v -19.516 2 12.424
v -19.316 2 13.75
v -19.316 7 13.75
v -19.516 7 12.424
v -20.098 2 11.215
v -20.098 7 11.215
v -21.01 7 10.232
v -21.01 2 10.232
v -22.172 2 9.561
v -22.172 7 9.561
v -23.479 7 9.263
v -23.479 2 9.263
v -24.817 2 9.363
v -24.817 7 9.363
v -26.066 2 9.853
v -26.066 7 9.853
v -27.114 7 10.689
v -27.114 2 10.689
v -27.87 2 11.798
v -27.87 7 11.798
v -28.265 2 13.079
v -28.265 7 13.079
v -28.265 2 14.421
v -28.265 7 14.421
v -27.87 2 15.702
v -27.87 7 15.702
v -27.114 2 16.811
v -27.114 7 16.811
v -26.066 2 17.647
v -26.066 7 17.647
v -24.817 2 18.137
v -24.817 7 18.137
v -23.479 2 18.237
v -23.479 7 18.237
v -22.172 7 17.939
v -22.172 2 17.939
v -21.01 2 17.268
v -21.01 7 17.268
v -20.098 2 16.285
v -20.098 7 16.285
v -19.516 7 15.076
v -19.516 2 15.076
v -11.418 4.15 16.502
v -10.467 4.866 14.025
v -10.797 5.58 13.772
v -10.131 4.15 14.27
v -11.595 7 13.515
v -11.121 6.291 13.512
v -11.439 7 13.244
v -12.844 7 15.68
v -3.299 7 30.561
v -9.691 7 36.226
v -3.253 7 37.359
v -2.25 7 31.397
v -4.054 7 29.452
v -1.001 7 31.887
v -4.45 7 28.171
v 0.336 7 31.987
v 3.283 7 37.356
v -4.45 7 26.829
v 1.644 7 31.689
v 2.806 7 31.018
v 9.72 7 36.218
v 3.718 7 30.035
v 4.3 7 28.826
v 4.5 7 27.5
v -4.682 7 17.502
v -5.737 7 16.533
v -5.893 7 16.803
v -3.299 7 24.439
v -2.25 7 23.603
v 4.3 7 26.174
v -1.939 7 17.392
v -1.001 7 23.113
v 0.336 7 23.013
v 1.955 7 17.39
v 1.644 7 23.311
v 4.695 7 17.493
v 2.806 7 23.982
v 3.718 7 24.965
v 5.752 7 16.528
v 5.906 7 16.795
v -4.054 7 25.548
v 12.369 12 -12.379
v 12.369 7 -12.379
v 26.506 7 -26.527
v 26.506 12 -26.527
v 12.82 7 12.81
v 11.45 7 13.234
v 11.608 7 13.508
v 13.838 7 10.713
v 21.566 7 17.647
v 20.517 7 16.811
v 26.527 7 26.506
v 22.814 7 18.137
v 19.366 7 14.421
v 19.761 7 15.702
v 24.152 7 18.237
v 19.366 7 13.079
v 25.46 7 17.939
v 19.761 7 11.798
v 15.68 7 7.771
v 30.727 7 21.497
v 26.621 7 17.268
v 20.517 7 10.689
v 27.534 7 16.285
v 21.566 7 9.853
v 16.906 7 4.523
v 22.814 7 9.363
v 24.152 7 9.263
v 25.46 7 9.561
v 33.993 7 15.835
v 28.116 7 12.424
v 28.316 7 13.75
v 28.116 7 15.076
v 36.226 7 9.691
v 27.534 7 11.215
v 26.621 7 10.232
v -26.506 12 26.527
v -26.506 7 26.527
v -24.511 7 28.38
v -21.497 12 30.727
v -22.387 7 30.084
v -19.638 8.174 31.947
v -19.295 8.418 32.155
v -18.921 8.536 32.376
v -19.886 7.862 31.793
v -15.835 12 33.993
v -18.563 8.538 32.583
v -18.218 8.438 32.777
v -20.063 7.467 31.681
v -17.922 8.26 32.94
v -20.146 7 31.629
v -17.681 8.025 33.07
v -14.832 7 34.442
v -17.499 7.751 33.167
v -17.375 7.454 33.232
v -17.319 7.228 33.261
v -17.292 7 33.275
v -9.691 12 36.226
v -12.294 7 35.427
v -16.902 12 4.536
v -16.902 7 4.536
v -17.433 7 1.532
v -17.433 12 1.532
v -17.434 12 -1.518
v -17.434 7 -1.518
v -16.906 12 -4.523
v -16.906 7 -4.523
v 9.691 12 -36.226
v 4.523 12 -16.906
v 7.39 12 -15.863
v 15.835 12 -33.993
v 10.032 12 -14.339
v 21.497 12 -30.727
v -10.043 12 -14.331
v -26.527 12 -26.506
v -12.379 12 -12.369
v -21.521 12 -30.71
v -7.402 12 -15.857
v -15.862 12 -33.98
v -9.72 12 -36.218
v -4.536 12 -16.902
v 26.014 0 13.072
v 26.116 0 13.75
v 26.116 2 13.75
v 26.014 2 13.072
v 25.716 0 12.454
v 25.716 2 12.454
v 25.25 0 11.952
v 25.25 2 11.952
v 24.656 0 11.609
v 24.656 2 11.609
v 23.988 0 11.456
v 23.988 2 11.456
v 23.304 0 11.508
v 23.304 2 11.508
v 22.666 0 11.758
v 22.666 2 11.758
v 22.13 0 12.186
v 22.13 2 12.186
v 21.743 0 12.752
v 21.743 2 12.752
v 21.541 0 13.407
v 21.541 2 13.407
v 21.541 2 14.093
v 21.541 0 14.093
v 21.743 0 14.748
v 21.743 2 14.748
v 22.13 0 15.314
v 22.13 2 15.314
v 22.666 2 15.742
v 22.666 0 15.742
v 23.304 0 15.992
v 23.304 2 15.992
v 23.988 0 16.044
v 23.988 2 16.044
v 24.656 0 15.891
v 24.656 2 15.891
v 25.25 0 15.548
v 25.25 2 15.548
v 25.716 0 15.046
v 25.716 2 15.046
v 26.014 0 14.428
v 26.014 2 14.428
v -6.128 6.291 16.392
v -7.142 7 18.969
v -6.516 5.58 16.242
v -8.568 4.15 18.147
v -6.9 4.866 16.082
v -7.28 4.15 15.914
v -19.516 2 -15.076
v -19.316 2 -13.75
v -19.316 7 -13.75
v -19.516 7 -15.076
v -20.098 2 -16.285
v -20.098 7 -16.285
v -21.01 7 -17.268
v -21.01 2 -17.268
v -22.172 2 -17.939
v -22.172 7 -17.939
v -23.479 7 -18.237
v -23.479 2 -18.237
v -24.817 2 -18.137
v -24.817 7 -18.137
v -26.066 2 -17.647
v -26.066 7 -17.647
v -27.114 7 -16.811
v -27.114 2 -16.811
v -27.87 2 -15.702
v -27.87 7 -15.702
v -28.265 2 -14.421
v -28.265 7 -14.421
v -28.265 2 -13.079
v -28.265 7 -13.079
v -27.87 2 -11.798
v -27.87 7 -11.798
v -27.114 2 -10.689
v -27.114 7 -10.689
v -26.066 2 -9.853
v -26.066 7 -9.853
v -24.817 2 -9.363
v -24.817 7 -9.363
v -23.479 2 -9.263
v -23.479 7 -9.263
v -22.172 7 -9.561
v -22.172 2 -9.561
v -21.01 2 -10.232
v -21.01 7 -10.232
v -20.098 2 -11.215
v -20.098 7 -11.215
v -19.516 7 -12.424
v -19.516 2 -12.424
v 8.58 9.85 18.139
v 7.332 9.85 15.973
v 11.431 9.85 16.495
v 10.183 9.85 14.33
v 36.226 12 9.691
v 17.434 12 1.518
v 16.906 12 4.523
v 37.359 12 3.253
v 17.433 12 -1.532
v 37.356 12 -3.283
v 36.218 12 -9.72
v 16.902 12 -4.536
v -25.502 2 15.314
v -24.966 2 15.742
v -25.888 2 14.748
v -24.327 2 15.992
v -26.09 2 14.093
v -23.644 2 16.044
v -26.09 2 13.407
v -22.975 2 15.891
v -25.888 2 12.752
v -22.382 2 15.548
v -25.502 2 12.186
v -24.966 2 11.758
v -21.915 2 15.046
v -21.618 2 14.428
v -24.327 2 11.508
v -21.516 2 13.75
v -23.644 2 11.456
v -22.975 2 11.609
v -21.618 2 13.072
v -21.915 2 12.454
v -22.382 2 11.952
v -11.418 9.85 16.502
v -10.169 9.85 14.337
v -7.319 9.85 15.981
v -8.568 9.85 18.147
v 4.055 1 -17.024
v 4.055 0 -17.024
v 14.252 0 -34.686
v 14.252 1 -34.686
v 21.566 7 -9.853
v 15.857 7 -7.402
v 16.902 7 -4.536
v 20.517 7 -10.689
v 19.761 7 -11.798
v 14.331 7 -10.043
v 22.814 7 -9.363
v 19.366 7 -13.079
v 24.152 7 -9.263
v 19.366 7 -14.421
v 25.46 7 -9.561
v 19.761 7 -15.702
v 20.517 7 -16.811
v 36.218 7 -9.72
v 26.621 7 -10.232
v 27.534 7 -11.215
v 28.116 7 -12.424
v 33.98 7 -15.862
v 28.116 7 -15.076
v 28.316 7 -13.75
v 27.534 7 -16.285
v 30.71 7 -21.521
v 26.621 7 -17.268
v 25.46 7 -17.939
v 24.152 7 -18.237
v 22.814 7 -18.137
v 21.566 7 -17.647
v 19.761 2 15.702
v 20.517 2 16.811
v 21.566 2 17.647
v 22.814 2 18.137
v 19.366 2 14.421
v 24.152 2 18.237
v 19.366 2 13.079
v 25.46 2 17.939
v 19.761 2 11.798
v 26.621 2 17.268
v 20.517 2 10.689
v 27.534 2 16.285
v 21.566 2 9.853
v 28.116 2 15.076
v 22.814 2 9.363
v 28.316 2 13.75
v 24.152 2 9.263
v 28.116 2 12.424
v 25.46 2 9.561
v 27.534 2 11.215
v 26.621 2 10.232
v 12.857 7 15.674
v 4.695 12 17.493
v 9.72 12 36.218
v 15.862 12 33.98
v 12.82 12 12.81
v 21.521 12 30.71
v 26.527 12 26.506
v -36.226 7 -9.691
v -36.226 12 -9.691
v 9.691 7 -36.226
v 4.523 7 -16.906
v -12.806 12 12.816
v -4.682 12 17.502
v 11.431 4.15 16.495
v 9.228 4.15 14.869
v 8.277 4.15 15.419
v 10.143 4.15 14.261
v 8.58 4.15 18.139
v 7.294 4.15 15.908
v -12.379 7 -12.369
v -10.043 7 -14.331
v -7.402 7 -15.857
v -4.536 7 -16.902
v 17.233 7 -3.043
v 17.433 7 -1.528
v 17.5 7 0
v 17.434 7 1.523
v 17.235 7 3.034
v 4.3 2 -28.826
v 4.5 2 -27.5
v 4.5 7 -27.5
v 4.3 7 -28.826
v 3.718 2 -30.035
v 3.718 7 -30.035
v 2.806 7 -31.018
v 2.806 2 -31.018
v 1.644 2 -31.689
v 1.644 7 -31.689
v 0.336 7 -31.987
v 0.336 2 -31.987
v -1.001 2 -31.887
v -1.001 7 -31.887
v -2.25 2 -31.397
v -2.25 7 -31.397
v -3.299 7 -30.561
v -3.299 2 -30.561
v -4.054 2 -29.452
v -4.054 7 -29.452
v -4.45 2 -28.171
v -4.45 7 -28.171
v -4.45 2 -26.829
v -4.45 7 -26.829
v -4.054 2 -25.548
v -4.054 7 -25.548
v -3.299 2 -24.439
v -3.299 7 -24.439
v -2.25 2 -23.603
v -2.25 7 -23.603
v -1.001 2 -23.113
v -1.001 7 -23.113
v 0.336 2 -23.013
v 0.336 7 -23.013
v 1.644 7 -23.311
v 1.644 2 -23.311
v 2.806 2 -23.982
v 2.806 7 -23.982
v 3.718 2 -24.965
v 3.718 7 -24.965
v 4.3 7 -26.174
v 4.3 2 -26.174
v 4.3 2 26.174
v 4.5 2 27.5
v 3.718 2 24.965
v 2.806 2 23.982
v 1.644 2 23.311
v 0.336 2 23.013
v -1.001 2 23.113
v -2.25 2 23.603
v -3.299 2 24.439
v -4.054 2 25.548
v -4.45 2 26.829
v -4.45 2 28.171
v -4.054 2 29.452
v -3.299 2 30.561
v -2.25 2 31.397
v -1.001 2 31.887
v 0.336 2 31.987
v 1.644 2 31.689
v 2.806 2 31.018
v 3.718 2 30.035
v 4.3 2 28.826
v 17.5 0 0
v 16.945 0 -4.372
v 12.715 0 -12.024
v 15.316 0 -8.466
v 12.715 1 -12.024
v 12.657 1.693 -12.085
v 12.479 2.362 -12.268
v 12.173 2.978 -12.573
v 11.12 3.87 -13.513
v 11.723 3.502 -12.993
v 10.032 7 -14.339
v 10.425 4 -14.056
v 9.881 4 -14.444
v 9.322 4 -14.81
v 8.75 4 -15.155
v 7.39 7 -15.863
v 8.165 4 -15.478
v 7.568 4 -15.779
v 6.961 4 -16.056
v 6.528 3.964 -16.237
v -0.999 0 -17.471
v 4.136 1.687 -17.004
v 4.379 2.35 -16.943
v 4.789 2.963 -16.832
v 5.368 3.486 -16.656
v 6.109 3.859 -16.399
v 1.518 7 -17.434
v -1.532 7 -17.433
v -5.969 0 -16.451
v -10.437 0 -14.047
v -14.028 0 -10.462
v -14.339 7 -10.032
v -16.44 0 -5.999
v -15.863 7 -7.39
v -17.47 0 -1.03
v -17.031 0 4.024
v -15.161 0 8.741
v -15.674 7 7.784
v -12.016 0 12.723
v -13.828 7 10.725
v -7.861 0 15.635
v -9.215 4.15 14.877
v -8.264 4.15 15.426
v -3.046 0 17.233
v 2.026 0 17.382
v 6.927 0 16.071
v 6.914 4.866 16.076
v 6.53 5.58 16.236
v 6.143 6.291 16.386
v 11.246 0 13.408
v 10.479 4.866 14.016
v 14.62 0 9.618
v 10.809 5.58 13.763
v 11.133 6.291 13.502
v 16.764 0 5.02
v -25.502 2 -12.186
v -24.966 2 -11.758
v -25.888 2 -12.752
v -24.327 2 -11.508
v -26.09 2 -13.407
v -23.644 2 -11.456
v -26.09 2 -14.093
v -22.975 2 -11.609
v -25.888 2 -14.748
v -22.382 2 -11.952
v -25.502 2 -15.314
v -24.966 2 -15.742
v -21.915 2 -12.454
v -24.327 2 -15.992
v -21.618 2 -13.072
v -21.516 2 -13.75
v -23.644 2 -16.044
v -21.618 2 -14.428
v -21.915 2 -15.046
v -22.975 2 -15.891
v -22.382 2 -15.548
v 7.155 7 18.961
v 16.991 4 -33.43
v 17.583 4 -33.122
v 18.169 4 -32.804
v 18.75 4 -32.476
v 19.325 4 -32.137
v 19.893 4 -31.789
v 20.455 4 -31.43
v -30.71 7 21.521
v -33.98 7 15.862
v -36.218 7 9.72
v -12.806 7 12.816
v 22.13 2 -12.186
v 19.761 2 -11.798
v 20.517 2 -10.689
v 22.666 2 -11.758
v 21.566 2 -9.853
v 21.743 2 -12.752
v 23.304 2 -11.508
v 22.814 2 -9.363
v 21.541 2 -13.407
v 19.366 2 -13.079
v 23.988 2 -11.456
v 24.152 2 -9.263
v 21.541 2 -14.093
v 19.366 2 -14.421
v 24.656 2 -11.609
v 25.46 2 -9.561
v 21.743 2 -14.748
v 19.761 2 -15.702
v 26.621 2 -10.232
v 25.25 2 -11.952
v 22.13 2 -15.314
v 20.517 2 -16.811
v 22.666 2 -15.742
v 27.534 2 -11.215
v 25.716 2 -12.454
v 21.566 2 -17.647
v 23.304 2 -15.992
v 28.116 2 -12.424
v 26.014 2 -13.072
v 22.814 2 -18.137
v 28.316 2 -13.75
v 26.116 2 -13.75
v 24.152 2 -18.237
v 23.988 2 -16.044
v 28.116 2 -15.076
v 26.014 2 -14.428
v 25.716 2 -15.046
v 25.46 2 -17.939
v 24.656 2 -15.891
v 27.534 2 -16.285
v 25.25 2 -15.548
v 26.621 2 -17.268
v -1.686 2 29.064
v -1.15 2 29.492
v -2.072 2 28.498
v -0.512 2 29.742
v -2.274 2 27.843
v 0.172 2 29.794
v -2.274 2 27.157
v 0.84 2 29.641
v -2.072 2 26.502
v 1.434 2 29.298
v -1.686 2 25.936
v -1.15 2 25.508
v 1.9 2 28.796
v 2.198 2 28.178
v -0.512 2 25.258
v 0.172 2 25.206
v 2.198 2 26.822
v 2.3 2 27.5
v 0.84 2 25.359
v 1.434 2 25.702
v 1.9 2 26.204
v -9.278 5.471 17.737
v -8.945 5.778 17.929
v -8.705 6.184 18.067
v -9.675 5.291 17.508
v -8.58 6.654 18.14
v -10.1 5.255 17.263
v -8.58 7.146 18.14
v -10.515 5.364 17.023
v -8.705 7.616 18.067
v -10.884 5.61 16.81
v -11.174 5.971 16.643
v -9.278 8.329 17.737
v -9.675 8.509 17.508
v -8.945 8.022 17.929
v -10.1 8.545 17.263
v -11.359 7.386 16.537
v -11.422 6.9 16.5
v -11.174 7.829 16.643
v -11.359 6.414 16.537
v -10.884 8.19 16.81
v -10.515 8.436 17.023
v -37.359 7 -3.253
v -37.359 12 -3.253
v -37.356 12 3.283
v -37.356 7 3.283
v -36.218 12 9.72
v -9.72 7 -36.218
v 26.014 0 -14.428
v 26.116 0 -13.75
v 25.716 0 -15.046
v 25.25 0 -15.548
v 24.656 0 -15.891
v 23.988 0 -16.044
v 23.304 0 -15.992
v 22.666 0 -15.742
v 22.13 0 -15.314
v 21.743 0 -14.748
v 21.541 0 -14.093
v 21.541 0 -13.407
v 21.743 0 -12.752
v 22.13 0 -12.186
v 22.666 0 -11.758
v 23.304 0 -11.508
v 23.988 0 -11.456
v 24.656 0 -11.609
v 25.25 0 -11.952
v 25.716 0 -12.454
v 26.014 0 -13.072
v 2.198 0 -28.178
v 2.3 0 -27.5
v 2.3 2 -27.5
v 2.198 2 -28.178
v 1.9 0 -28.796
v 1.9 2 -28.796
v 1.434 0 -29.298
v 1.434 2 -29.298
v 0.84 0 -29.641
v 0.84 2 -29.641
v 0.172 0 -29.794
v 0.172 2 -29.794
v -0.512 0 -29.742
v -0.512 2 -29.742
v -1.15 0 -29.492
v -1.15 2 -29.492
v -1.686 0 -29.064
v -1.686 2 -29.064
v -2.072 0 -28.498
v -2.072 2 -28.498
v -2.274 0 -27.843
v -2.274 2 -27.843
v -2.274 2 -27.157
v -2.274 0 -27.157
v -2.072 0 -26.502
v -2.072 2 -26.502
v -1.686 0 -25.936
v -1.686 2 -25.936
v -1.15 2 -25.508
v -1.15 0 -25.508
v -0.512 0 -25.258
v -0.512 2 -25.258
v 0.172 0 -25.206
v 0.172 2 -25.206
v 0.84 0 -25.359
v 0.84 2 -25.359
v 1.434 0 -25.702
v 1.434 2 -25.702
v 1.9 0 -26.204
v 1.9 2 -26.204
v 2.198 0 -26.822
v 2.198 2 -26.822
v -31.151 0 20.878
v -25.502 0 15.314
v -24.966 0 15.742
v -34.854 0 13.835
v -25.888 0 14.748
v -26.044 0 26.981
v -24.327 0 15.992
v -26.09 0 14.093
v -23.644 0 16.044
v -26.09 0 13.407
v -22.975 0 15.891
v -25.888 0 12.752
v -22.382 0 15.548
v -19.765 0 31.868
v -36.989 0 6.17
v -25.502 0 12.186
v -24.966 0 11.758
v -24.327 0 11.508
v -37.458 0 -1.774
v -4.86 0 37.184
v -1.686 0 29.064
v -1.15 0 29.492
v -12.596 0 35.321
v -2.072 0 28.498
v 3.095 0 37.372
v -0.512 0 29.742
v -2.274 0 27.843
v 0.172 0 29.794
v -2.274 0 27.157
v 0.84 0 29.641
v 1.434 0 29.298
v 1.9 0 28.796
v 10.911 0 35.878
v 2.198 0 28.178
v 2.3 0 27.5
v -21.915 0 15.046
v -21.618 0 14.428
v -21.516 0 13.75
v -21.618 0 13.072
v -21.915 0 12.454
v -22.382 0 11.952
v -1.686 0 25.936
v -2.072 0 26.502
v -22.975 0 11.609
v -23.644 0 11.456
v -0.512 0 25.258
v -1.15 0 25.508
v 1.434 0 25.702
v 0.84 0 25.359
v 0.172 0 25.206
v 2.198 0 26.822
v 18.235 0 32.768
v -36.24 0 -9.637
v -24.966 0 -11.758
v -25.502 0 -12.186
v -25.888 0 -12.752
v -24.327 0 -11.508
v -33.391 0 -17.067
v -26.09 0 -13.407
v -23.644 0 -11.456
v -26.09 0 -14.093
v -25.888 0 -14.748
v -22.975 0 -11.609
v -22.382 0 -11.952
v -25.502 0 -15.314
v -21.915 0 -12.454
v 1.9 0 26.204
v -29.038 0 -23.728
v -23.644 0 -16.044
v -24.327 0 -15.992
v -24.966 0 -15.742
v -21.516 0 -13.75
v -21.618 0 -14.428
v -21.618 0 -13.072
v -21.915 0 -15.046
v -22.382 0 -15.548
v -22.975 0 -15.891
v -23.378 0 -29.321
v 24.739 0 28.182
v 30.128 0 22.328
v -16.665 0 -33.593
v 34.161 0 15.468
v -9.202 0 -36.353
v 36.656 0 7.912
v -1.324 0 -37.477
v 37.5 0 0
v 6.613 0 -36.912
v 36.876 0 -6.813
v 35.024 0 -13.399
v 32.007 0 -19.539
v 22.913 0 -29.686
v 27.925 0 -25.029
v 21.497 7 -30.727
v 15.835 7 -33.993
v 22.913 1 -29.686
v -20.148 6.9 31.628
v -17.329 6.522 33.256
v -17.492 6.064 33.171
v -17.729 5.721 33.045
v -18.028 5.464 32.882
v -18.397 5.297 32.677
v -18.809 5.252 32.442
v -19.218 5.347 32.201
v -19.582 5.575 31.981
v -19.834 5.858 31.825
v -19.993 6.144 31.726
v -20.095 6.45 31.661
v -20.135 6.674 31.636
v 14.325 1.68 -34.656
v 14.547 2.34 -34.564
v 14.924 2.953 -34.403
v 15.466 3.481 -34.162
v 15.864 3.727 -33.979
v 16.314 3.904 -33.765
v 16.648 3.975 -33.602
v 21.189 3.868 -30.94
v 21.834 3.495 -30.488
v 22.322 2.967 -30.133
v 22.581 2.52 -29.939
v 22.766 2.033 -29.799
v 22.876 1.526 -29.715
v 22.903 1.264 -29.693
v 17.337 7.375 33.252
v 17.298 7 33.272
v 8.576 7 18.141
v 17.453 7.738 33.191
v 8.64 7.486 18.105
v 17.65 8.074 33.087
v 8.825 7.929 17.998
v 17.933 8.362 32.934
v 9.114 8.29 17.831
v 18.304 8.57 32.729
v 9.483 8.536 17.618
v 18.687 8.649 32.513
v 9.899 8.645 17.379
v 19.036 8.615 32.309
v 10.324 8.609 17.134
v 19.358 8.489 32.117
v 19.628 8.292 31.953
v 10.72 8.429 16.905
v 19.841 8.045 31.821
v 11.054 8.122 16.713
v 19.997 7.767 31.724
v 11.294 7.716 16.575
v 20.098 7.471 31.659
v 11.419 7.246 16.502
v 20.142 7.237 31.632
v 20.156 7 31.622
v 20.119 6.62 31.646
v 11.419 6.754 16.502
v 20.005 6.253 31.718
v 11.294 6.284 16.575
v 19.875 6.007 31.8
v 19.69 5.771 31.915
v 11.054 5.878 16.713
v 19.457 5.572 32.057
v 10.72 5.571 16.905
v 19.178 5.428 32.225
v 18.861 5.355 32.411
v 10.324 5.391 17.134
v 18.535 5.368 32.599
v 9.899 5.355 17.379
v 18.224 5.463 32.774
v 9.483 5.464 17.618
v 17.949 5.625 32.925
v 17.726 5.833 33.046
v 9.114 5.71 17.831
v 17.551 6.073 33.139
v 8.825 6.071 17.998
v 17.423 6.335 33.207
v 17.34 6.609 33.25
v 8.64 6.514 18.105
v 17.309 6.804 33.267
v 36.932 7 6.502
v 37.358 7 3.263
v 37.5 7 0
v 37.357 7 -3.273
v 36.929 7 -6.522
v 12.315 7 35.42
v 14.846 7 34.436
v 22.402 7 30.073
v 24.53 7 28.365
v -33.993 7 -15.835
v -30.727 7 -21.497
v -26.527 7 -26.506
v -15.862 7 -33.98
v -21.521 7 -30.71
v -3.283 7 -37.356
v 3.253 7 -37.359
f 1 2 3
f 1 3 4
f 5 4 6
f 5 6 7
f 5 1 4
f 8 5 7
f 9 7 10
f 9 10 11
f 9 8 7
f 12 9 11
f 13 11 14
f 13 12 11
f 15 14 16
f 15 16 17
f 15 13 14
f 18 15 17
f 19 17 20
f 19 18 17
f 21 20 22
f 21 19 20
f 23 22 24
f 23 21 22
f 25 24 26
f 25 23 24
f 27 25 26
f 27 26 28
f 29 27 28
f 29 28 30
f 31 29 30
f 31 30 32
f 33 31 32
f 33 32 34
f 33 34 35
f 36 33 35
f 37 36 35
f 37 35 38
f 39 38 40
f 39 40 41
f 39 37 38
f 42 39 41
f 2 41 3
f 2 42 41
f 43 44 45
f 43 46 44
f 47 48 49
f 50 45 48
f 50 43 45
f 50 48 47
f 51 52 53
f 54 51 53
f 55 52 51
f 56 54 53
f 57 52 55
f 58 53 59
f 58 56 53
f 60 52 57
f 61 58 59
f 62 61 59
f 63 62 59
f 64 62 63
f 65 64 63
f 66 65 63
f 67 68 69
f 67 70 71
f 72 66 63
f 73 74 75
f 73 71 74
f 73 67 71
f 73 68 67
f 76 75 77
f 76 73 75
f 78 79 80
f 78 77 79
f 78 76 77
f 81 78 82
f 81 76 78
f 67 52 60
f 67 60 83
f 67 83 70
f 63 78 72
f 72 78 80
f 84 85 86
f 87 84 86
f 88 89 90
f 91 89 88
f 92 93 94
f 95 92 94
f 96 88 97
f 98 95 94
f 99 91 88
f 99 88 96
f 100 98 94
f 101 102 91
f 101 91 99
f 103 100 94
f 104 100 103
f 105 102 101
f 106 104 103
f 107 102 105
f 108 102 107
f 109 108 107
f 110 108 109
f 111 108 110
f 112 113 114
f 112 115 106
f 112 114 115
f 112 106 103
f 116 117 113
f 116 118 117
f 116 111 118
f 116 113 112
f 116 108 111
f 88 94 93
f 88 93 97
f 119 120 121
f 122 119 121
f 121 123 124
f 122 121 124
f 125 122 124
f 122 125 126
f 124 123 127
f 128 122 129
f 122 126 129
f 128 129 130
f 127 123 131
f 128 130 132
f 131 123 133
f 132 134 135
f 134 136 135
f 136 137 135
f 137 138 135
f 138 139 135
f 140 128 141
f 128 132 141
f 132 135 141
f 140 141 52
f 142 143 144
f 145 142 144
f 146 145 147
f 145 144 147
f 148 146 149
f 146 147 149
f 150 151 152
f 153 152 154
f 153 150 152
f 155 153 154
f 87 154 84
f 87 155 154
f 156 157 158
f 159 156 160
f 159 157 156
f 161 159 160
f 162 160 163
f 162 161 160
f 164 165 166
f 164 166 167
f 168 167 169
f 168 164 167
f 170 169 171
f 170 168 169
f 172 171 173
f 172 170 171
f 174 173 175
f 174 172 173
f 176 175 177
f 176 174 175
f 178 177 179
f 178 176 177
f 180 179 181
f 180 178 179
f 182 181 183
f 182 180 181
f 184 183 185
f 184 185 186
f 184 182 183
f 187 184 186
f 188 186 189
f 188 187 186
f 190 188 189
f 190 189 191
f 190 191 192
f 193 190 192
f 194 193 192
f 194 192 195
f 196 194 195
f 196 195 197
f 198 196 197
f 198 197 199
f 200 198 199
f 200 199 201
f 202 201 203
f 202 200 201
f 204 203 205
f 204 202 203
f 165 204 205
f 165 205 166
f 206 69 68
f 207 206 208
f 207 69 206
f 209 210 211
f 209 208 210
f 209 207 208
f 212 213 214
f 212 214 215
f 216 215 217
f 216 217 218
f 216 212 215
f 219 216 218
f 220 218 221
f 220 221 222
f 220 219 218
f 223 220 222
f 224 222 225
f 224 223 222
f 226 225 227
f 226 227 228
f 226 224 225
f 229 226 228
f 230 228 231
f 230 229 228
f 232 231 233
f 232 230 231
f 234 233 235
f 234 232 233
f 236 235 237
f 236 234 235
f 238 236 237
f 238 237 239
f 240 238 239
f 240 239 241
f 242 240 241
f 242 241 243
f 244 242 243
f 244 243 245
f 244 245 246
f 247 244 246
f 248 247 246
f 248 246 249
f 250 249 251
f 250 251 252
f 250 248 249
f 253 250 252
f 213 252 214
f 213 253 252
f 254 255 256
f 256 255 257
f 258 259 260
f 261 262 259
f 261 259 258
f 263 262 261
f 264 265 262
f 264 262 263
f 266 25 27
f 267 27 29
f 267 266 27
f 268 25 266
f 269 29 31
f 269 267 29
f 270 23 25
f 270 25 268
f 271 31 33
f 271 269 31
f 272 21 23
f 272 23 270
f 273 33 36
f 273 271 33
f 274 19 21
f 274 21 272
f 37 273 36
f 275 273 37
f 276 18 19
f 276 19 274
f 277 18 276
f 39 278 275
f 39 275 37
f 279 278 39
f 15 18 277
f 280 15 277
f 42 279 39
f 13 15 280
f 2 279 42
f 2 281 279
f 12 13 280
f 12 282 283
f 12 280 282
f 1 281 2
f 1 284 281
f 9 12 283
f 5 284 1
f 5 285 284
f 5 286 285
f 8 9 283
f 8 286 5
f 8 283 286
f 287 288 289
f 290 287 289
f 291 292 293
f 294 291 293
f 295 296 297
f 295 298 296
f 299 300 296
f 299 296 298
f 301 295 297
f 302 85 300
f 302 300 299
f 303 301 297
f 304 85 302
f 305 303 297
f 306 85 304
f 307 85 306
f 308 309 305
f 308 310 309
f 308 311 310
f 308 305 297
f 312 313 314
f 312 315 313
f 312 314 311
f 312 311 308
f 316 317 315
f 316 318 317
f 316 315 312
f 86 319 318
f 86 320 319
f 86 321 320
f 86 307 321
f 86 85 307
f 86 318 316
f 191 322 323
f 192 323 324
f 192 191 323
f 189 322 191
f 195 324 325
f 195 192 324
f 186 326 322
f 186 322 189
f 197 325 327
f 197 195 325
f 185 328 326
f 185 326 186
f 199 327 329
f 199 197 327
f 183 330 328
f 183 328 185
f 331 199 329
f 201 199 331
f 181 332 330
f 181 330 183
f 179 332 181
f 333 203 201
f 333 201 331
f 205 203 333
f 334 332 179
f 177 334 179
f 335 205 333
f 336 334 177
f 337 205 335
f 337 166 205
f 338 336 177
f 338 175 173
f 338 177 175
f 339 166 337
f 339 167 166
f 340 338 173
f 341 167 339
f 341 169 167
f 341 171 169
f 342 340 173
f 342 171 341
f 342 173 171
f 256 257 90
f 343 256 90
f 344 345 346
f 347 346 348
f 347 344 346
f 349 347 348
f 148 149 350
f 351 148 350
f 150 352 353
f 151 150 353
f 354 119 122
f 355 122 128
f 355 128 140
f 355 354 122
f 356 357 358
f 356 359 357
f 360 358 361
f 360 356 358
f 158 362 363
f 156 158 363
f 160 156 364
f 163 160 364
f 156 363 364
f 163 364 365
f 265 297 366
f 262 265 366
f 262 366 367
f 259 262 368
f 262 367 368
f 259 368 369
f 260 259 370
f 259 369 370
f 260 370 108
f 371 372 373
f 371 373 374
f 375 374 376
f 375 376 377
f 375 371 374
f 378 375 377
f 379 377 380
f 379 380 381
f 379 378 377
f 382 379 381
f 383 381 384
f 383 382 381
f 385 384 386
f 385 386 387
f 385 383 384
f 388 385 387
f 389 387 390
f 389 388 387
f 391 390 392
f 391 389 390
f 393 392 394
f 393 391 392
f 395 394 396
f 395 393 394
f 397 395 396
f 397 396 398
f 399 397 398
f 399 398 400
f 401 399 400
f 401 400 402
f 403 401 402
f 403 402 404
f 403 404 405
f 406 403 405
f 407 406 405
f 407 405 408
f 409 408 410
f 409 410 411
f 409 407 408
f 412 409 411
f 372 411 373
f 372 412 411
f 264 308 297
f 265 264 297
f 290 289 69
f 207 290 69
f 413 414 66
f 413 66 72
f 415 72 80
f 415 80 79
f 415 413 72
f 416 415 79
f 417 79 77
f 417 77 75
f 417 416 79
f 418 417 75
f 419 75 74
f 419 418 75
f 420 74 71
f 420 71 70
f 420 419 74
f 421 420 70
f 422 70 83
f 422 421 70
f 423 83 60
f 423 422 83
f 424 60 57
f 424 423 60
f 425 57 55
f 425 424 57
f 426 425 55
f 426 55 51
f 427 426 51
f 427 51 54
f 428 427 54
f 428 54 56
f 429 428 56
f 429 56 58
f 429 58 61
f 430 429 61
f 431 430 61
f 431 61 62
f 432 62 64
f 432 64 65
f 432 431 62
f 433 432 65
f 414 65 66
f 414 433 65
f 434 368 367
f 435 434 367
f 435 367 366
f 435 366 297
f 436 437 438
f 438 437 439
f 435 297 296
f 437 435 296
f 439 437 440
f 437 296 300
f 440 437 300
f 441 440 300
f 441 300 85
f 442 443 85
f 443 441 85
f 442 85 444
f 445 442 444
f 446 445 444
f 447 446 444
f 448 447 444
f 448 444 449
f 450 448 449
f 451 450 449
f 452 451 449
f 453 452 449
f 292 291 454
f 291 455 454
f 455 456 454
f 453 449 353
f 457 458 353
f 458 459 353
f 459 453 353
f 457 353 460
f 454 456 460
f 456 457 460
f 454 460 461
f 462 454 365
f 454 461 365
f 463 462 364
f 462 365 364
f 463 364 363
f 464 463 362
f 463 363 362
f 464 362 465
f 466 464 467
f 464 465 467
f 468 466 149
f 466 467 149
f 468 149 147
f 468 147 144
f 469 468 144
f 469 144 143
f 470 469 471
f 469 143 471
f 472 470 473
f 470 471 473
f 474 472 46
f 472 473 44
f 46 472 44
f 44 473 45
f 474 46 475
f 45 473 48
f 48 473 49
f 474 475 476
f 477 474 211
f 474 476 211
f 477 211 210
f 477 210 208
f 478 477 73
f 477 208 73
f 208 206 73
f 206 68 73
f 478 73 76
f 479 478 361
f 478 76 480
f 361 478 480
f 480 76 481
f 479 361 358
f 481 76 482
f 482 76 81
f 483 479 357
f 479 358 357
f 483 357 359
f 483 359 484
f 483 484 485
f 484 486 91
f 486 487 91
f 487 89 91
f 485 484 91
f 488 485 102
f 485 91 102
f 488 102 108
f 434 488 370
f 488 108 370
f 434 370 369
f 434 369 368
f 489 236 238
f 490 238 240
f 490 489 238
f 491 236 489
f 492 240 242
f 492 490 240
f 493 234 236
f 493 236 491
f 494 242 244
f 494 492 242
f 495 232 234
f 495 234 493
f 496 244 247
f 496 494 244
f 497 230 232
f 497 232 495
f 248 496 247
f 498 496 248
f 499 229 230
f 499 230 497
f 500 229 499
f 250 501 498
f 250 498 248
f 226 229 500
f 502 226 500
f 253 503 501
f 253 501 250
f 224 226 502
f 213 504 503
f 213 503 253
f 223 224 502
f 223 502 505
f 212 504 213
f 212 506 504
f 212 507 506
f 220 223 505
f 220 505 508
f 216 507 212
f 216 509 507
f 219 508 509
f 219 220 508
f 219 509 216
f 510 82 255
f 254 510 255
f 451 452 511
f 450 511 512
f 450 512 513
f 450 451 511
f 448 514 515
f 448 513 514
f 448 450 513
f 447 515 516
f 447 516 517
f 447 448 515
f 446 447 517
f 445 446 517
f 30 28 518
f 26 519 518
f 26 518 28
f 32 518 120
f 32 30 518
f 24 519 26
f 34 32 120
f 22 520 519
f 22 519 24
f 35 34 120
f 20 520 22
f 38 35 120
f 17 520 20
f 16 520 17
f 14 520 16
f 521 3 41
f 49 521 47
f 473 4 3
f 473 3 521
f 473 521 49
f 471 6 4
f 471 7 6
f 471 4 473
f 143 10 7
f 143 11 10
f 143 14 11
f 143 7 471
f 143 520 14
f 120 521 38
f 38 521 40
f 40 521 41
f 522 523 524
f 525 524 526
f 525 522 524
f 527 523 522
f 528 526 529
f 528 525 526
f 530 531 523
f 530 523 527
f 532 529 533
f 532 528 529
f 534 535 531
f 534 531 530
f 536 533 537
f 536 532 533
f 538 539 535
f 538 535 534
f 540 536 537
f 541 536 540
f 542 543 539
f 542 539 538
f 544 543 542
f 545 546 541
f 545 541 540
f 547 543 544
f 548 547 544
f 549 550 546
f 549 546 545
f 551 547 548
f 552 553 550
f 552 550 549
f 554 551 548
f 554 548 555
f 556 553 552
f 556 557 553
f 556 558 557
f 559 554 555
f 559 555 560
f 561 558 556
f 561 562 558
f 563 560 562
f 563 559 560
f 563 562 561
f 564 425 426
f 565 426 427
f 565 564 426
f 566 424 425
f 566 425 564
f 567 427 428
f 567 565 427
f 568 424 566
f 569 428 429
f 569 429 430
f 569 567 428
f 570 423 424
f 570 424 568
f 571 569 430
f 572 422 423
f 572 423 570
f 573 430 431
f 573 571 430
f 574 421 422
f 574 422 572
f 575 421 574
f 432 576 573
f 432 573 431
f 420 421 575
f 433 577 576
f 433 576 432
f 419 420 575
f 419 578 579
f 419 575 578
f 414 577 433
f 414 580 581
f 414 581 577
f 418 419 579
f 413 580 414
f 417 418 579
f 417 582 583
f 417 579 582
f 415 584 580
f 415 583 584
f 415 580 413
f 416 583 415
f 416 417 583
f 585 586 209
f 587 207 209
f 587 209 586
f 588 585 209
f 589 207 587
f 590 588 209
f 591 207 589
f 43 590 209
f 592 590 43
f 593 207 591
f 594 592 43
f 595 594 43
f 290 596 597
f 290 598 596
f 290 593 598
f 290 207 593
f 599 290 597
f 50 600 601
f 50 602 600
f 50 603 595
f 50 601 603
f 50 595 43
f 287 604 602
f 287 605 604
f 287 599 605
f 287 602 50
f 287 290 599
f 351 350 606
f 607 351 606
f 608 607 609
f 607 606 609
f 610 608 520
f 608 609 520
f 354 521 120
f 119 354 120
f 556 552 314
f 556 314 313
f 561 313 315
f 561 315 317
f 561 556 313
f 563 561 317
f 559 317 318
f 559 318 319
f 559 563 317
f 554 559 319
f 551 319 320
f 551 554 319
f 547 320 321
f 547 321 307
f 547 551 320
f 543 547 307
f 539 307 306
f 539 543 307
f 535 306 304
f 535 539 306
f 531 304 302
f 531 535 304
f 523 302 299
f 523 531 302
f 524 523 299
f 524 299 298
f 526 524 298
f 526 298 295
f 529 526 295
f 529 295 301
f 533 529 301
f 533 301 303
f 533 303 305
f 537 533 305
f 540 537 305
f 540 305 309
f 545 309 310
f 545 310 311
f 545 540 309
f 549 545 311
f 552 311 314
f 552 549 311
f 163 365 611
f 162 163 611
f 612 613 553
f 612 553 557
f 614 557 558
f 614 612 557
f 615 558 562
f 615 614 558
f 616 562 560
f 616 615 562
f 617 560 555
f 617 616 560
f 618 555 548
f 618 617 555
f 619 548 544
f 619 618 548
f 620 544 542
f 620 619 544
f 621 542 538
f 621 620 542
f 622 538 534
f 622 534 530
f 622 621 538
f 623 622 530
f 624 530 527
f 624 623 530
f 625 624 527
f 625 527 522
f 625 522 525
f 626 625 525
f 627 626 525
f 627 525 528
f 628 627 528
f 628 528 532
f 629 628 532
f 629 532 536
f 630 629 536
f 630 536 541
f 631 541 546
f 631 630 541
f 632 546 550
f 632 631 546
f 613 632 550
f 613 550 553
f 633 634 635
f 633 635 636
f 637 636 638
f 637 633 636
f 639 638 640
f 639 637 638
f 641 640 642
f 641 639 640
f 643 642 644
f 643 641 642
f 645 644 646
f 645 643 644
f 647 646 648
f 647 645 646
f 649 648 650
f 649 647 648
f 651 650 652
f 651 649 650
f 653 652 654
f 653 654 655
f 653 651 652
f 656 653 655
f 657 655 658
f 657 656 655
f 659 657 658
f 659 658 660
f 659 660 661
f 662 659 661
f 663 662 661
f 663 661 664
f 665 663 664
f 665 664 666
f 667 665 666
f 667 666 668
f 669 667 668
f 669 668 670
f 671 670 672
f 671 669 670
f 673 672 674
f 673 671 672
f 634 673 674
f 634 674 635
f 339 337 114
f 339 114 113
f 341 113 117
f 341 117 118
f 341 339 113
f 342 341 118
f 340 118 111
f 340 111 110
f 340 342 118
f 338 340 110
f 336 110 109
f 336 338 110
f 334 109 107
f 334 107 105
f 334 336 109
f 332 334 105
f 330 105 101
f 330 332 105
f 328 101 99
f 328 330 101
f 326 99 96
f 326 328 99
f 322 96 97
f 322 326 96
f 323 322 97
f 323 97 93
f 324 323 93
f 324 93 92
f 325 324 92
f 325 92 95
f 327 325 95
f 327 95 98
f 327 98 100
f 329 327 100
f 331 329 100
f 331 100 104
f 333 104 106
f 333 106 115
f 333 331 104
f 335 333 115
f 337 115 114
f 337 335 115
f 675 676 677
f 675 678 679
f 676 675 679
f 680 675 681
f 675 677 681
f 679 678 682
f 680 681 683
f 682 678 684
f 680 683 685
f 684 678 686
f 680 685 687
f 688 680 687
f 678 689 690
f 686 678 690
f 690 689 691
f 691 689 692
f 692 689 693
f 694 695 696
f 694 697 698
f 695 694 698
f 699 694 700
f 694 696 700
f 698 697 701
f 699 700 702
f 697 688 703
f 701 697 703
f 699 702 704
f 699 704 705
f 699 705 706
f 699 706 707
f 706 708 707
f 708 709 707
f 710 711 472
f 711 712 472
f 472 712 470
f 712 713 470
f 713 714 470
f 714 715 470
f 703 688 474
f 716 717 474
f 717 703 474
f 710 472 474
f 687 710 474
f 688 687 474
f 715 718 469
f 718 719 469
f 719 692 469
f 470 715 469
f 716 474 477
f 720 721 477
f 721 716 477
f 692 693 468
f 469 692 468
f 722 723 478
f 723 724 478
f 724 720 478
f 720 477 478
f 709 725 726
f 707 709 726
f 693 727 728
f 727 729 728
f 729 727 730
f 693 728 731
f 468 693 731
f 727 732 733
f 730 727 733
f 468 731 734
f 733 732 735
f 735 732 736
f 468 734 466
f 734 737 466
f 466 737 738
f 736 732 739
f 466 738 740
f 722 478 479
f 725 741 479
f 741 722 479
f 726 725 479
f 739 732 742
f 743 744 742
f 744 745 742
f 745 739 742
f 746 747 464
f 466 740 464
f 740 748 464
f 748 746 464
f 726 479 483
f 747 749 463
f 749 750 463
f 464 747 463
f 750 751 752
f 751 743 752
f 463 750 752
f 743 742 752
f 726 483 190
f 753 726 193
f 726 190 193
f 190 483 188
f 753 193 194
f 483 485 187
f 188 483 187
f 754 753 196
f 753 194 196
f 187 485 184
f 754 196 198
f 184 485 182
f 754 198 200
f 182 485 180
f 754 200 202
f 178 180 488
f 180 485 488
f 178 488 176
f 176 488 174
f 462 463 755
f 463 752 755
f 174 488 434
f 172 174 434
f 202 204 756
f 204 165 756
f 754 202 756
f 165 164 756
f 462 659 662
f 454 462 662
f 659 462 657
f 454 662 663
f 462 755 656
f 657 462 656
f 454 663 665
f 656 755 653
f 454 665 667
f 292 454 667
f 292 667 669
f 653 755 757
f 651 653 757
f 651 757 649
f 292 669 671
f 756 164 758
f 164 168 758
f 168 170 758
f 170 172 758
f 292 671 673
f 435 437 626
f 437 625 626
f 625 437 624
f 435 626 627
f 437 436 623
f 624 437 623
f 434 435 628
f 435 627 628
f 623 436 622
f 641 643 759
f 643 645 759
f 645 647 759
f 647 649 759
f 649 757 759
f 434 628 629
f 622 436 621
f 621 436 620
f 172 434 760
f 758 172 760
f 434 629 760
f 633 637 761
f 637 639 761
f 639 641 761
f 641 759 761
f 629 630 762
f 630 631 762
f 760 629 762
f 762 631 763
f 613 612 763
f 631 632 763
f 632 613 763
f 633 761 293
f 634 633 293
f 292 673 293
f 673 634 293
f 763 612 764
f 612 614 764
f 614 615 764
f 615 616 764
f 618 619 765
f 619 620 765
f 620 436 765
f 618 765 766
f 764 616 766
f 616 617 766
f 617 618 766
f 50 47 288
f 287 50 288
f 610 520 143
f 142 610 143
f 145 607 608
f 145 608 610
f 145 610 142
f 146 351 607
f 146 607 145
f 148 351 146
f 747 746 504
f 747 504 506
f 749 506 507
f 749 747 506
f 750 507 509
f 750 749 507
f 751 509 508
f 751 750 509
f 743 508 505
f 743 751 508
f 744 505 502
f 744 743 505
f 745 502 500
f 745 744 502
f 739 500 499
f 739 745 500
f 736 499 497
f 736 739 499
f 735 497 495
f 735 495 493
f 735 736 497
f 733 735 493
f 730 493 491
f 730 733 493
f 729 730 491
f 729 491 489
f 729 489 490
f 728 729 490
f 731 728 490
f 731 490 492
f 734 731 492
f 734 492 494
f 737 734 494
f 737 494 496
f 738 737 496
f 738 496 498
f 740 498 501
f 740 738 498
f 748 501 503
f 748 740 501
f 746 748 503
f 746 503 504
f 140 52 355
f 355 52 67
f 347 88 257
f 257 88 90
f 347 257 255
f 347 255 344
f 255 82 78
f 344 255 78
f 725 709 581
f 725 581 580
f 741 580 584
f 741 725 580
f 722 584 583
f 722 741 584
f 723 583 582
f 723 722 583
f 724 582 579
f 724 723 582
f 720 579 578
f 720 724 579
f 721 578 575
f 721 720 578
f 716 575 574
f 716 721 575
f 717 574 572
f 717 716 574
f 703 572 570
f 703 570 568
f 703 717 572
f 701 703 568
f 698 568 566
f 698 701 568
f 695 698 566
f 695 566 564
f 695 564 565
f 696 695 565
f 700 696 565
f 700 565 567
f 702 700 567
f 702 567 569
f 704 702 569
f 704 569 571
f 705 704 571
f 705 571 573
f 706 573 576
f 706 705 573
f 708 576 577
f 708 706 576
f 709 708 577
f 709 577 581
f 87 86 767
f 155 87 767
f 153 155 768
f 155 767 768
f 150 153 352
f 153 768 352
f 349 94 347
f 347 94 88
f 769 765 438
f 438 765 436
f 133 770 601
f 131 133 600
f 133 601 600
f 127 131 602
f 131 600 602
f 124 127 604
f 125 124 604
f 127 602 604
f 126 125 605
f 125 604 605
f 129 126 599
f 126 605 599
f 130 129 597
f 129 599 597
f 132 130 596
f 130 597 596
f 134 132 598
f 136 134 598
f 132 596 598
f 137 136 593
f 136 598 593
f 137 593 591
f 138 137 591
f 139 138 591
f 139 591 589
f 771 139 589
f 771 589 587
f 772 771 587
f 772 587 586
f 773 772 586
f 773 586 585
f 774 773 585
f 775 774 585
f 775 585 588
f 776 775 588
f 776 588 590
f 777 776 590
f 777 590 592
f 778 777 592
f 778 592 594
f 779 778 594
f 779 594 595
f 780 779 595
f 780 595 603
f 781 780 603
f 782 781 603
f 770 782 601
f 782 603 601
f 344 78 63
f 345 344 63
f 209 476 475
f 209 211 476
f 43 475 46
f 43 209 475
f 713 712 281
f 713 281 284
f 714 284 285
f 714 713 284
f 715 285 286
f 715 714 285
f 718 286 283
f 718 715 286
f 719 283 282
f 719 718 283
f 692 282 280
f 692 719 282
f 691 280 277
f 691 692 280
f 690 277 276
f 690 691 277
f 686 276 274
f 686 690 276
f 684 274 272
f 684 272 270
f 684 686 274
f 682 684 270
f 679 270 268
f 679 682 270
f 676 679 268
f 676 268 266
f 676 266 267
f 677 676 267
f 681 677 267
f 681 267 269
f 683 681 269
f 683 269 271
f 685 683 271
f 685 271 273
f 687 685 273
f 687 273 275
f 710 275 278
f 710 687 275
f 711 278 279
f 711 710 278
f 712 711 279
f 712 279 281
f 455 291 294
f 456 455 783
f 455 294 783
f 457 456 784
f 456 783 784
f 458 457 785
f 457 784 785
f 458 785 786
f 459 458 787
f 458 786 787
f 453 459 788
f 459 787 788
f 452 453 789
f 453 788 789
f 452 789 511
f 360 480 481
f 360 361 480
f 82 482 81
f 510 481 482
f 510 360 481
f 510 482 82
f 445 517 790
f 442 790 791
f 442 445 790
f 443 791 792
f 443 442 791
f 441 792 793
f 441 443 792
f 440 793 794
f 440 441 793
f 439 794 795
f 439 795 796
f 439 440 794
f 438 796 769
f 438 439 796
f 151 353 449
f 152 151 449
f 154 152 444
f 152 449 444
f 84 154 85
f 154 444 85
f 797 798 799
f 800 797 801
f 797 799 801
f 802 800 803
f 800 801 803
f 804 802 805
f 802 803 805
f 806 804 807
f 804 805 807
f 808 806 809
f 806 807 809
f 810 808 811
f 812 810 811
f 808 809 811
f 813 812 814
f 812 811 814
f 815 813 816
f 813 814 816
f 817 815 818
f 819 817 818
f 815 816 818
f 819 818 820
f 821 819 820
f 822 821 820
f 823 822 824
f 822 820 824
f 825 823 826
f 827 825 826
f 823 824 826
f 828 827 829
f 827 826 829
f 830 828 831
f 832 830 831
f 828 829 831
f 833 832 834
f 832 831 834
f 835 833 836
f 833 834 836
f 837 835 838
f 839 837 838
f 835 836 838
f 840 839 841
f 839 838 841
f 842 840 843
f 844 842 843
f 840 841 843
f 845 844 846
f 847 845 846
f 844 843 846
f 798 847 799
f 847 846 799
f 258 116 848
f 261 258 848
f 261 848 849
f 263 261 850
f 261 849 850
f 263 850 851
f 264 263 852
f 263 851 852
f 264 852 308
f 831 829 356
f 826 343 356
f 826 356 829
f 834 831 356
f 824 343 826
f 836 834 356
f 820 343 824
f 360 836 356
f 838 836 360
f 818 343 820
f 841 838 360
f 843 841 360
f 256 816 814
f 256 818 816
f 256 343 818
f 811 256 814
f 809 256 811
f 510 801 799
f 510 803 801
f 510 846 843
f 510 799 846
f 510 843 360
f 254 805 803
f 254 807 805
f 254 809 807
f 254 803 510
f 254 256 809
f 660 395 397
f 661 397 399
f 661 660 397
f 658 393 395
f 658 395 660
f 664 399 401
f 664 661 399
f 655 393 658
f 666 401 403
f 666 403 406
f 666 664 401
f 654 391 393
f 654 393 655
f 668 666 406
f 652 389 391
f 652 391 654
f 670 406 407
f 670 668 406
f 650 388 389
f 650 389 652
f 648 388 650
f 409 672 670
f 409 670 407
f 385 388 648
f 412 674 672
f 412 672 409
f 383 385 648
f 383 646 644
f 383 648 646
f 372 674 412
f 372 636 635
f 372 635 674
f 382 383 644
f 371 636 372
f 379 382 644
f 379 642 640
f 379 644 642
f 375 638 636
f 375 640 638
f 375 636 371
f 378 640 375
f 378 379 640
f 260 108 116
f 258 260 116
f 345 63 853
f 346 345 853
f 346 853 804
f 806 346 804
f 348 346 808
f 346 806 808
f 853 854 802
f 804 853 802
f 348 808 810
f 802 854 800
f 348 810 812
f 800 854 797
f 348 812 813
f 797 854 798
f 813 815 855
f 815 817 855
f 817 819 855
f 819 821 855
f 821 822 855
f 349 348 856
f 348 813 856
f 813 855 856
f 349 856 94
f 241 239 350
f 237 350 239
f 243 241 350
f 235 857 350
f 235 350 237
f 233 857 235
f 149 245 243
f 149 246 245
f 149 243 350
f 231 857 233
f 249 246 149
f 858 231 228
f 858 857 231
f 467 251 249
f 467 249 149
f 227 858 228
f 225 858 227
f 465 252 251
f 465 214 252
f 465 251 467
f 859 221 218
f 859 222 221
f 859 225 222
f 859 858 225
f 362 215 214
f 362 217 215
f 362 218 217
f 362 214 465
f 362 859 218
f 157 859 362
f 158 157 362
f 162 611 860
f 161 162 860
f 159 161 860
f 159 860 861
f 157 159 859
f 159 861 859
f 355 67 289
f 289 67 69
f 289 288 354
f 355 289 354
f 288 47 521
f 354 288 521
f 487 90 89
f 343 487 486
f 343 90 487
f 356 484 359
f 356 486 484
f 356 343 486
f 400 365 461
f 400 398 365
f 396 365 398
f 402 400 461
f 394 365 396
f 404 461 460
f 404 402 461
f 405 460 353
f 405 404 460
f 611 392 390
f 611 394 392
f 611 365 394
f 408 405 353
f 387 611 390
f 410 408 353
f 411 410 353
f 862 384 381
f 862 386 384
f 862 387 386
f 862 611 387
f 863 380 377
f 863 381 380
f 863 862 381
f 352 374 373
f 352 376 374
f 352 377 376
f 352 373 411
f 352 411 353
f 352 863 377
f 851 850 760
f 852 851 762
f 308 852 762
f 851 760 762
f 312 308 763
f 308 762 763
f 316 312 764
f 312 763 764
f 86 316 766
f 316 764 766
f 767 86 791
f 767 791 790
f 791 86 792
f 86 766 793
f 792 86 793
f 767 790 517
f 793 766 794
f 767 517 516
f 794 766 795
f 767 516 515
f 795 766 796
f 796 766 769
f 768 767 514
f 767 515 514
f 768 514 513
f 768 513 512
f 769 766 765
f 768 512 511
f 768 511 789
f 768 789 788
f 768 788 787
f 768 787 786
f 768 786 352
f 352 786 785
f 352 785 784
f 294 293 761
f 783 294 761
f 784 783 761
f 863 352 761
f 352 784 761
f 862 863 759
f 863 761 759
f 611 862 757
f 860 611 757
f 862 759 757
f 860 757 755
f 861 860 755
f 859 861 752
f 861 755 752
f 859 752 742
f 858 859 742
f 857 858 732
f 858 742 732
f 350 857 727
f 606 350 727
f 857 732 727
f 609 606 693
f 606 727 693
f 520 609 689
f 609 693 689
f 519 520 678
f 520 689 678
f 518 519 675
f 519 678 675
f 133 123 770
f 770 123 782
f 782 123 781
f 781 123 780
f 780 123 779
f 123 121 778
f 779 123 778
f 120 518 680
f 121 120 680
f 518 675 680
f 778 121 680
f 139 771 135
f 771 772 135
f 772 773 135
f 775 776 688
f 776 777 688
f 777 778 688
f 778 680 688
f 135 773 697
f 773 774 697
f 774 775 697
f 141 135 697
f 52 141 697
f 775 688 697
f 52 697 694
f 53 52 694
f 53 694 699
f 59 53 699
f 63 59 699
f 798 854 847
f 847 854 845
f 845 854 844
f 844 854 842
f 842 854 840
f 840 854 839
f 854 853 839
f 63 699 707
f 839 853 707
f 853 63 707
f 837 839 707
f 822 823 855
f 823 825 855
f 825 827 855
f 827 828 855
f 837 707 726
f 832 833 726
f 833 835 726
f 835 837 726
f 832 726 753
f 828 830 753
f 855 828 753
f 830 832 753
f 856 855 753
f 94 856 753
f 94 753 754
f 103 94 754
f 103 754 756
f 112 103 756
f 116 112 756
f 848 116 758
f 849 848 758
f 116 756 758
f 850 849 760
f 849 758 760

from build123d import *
from build123d.topology import SkipClean

# Parameters (mm, degrees)
SKETCH1_R               = 37.5
SKETCH1_R_2             = 2.3
BOSS_EXTRUDE1_DEPTH     = 2
SKETCH2_R               = 37.5
SKETCH2_R_2             = 4.5
BOSS_EXTRUDE2_DEPTH     = 5
BOSS_EXTRUDE3_DEPTH     = 5
CUT_EXTRUDE1_START      = -7
SKETCH4_R               = 17.5
CUT_EXTRUDE1_DEPTH      = 7
CUT_EXTRUDE2_DEPTH      = 7
CUT_EXTRUDE2_DEPTH_BACK = 2.5
CUT_EXTRUDE4_DEPTH      = 3
CUT_EXTRUDE4_DEPTH_BACK = 2.5
SKETCH10_R              = 1.65
CUT_EXTRUDE7_DEPTH      = 20
SKETCH9_R               = 1.65
CUT_EXTRUDE6_DEPTH      = 20
CUT_EXTRUDE8_DEPTH      = 4
FILLET1_R               = 3


with BuildPart() as part:
    # Sketch1 → Boss-Extrude1 (new body)
    with BuildSketch(Plane(origin=(0, 0, 0), x_dir=(1, 0, 0), z_dir=(0, 1, 0))):
        Circle(SKETCH1_R)
        with Locations((0, 27.5)):
            Circle(SKETCH1_R_2, mode=Mode.SUBTRACT)
        with Locations((23.815698604, 13.75)):
            Circle(SKETCH1_R_2, mode=Mode.SUBTRACT)
        with Locations((23.815698604, -13.75)):
            Circle(SKETCH1_R_2, mode=Mode.SUBTRACT)
        with Locations((0, -27.5)):
            Circle(SKETCH1_R_2, mode=Mode.SUBTRACT)
        with Locations((-23.815698604, -13.75)):
            Circle(SKETCH1_R_2, mode=Mode.SUBTRACT)
        with Locations((-23.815698604, 13.75)):
            Circle(SKETCH1_R_2, mode=Mode.SUBTRACT)
    extrude(amount=BOSS_EXTRUDE1_DEPTH)

    # Sketch2 → Boss-Extrude2 (add)
    with BuildSketch(Plane(origin=(0, 2, 0), x_dir=(1, 0, 0), z_dir=(0, 1, 0))):
        Circle(SKETCH2_R)
        with Locations((-23.815698604, -13.75)):
            Circle(SKETCH2_R_2, mode=Mode.SUBTRACT)
        with Locations((0, -27.5)):
            Circle(SKETCH2_R_2, mode=Mode.SUBTRACT)
        with Locations((23.815698604, -13.75)):
            Circle(SKETCH2_R_2, mode=Mode.SUBTRACT)
        with Locations((-23.815698604, 13.75)):
            Circle(SKETCH2_R_2, mode=Mode.SUBTRACT)
        with Locations((23.815698604, 13.75)):
            Circle(SKETCH2_R_2, mode=Mode.SUBTRACT)
        with Locations((0, 27.5)):
            Circle(SKETCH2_R_2, mode=Mode.SUBTRACT)
    extrude(amount=BOSS_EXTRUDE2_DEPTH)

    # Sketch3 → Boss-Extrude3 (add)
    with BuildSketch(Plane(origin=(0, 7, 0), x_dir=(1, 0, 0), z_dir=(0, 1, 0))):
        with BuildLine():
            Line((-26.527052262, 26.50595213), (-12.379291055, 12.369444327))
            ThreePointArc((-12.379291055, 12.369444327), (-8.756029172, 15.151962023), (-4.536058371, 16.901898546))
            Line((-4.536058371, 16.901898546), (-9.720125081, 36.218354027))
            ThreePointArc((-9.720125081, 36.218354027), (-18.762919655, 32.468490048), (-26.527052262, 26.50595213))
        make_face()
        with BuildLine():
            ThreePointArc((-16.901898546, -4.536058371), (-17.499998615, -0.006962688), (-16.905502698, 4.52260749))
            Line((-16.905502698, 4.52260749), (-36.226077211, 9.691301765))
            ThreePointArc((-36.226077211, 9.691301765), (-37.499997032, -0.014920046), (-36.218354027, -9.720125081))
            Line((-36.218354027, -9.720125081), (-16.901898546, -4.536058371))
        make_face()
        with BuildLine():
            ThreePointArc((4.52260749, 16.905502698), (8.743969443, 15.158924711), (12.369444327, 12.379291055))
            Line((12.369444327, 12.379291055), (26.50595213, 26.527052262))
            ThreePointArc((26.50595213, 26.527052262), (18.737077377, 32.483410095), (9.691301765, 36.226077211))
            Line((9.691301765, 36.226077211), (4.52260749, 16.905502698))
        make_face()
        with BuildLine():
            ThreePointArc((16.901898546, 4.536058371), (17.499998615, 0.006962688), (16.905502698, -4.52260749))
            Line((16.905502698, -4.52260749), (36.226077211, -9.691301765))
            ThreePointArc((36.226077211, -9.691301765), (37.499997032, 0.014920046), (36.218354027, 9.720125081))
            Line((36.218354027, 9.720125081), (16.901898546, 4.536058371))
        make_face()
        with BuildLine():
            Line((-12.805791077, -12.81598516), (-26.50595213, -26.527052262))
            ThreePointArc((-26.50595213, -26.527052262), (-18.737077377, -32.483410095), (-9.691301765, -36.226077211))
            Line((-9.691301765, -36.226077211), (-4.682147808, -17.501864262))
            Line((-4.682147808, -17.501864262), (-12.805791077, -12.81598516))
        make_face()
        with BuildLine():
            Line((12.819708432, -12.809511387), (4.694715176, -17.493072864))
            Line((4.694715176, -17.493072864), (9.720125081, -36.218354027))
            ThreePointArc((9.720125081, -36.218354027), (18.762919655, -32.468490048), (26.527052262, -26.50595213))
            Line((26.527052262, -26.50595213), (12.819708432, -12.809511387))
        make_face()
    extrude(amount=BOSS_EXTRUDE3_DEPTH)

    # Sketch4 → Cut-Extrude1 (cut)
    with SkipClean():  # the faces are left unmerged after this step: merging them gives an invalid solid
        with BuildSketch(Plane(origin=(0, 7, 0), x_dir=(1, 0, 0), z_dir=(0, 1, 0)).offset(CUT_EXTRUDE1_START)):
            Circle(SKETCH4_R)
        extrude(amount=CUT_EXTRUDE1_DEPTH, mode=Mode.SUBTRACT)

    # Sketch5 → Cut-Extrude2 (cut, two sides: drawn at the far end of the back side and taken through both)
    with SkipClean():  # the faces are left unmerged after this step: merging them gives an invalid solid
        with BuildSketch(Plane(origin=(-8.743969443, 0, 15.158924711), x_dir=(-0.8662242691872709, 0, -0.49965539671955755), z_dir=(0.49965539671955755, 0, -0.8662242691872709)).offset(-CUT_EXTRUDE2_DEPTH_BACK)):
            Polygon((-1.645448267, 9.85), (-3.290896534, 7), (-1.645448267, 4.15), (1.645448267, 4.15), (3.290896534, 7), (1.645448267, 9.85), align=None)
        extrude(amount=CUT_EXTRUDE2_DEPTH + CUT_EXTRUDE2_DEPTH_BACK, mode=Mode.SUBTRACT)

    # Sketch7 → Cut-Extrude4 (cut, two sides: drawn at the far end of the back side and taken through both)
    with SkipClean():  # the faces are left unmerged after this step: merging them gives an invalid solid
        with BuildSketch(Plane(origin=(8.739633736, 0, 15.161424807), x_dir=(-0.8663671318105545, 0, 0.49940764203038923), z_dir=(-0.49940764203038923, 0, -0.8663671318105545)).offset(-CUT_EXTRUDE4_DEPTH_BACK)):
            Polygon((-1.665737666, 9.85), (-3.311185933, 7), (-1.665737666, 4.15), (1.625158868, 4.15), (3.270607135, 7), (1.625158868, 9.85), align=None)
        extrude(amount=CUT_EXTRUDE4_DEPTH + CUT_EXTRUDE4_DEPTH_BACK, mode=Mode.SUBTRACT)

    # Sketch10 → Cut-Extrude7 (cut)
    with SkipClean():  # the faces are left unmerged after this step: merging them gives an invalid solid
        with BuildSketch(Plane(origin=(8.739633736, 0, 15.161424807), x_dir=(-0.8663671318105323, 0, 0.49940764203042776), z_dir=(-0.4994076420304278, 0, -0.8663671318105324))):
            with Locations((-0.020289399, 7)):
                Circle(SKETCH10_R)
        extrude(amount=-CUT_EXTRUDE7_DEPTH, mode=Mode.SUBTRACT)

    # Sketch9 → Cut-Extrude6 (cut)
    with SkipClean():  # the faces are left unmerged after this step: merging them gives an invalid solid
        with BuildSketch(Plane(origin=(-9.993107934, 0, 17.324485384), x_dir=(-0.866224269187271, 0, -0.4996553967195575), z_dir=(0.49965539671955744, 0, -0.8662242691872709))):
            with Locations((0, 6.9)):
                Circle(SKETCH9_R)
        extrude(amount=-CUT_EXTRUDE6_DEPTH, mode=Mode.SUBTRACT)

    # Sketch14 → Cut-Extrude8 (cut)
    with SkipClean():  # the faces are left unmerged after this step: merging them gives an invalid solid
        with BuildSketch(Plane.XZ):
            with BuildLine():
                Line((4.055127897, -17.023687548), (14.252458915, -34.685982974))
                ThreePointArc((14.252458915, -34.685982974), (18.75, -32.475952642), (22.912712953, -29.685982974))
                Line((22.912712953, -29.685982974), (12.715381935, -12.023687548))
                ThreePointArc((12.715381935, -12.023687548), (8.75, -15.155444566), (4.055127897, -17.023687548))
            make_face()
        extrude(amount=-CUT_EXTRUDE8_DEPTH, mode=Mode.SUBTRACT)

    # Fillet1
    fillet1_edges = [part.edges().sort_by_distance(p)[0] for p in [
        (17.814047444, 4, -20.854835261),
        (9.153793406, 4, -25.854835261),
    ]]
    fillet(fillet1_edges, radius=FILLET1_R)


solid = part.part
